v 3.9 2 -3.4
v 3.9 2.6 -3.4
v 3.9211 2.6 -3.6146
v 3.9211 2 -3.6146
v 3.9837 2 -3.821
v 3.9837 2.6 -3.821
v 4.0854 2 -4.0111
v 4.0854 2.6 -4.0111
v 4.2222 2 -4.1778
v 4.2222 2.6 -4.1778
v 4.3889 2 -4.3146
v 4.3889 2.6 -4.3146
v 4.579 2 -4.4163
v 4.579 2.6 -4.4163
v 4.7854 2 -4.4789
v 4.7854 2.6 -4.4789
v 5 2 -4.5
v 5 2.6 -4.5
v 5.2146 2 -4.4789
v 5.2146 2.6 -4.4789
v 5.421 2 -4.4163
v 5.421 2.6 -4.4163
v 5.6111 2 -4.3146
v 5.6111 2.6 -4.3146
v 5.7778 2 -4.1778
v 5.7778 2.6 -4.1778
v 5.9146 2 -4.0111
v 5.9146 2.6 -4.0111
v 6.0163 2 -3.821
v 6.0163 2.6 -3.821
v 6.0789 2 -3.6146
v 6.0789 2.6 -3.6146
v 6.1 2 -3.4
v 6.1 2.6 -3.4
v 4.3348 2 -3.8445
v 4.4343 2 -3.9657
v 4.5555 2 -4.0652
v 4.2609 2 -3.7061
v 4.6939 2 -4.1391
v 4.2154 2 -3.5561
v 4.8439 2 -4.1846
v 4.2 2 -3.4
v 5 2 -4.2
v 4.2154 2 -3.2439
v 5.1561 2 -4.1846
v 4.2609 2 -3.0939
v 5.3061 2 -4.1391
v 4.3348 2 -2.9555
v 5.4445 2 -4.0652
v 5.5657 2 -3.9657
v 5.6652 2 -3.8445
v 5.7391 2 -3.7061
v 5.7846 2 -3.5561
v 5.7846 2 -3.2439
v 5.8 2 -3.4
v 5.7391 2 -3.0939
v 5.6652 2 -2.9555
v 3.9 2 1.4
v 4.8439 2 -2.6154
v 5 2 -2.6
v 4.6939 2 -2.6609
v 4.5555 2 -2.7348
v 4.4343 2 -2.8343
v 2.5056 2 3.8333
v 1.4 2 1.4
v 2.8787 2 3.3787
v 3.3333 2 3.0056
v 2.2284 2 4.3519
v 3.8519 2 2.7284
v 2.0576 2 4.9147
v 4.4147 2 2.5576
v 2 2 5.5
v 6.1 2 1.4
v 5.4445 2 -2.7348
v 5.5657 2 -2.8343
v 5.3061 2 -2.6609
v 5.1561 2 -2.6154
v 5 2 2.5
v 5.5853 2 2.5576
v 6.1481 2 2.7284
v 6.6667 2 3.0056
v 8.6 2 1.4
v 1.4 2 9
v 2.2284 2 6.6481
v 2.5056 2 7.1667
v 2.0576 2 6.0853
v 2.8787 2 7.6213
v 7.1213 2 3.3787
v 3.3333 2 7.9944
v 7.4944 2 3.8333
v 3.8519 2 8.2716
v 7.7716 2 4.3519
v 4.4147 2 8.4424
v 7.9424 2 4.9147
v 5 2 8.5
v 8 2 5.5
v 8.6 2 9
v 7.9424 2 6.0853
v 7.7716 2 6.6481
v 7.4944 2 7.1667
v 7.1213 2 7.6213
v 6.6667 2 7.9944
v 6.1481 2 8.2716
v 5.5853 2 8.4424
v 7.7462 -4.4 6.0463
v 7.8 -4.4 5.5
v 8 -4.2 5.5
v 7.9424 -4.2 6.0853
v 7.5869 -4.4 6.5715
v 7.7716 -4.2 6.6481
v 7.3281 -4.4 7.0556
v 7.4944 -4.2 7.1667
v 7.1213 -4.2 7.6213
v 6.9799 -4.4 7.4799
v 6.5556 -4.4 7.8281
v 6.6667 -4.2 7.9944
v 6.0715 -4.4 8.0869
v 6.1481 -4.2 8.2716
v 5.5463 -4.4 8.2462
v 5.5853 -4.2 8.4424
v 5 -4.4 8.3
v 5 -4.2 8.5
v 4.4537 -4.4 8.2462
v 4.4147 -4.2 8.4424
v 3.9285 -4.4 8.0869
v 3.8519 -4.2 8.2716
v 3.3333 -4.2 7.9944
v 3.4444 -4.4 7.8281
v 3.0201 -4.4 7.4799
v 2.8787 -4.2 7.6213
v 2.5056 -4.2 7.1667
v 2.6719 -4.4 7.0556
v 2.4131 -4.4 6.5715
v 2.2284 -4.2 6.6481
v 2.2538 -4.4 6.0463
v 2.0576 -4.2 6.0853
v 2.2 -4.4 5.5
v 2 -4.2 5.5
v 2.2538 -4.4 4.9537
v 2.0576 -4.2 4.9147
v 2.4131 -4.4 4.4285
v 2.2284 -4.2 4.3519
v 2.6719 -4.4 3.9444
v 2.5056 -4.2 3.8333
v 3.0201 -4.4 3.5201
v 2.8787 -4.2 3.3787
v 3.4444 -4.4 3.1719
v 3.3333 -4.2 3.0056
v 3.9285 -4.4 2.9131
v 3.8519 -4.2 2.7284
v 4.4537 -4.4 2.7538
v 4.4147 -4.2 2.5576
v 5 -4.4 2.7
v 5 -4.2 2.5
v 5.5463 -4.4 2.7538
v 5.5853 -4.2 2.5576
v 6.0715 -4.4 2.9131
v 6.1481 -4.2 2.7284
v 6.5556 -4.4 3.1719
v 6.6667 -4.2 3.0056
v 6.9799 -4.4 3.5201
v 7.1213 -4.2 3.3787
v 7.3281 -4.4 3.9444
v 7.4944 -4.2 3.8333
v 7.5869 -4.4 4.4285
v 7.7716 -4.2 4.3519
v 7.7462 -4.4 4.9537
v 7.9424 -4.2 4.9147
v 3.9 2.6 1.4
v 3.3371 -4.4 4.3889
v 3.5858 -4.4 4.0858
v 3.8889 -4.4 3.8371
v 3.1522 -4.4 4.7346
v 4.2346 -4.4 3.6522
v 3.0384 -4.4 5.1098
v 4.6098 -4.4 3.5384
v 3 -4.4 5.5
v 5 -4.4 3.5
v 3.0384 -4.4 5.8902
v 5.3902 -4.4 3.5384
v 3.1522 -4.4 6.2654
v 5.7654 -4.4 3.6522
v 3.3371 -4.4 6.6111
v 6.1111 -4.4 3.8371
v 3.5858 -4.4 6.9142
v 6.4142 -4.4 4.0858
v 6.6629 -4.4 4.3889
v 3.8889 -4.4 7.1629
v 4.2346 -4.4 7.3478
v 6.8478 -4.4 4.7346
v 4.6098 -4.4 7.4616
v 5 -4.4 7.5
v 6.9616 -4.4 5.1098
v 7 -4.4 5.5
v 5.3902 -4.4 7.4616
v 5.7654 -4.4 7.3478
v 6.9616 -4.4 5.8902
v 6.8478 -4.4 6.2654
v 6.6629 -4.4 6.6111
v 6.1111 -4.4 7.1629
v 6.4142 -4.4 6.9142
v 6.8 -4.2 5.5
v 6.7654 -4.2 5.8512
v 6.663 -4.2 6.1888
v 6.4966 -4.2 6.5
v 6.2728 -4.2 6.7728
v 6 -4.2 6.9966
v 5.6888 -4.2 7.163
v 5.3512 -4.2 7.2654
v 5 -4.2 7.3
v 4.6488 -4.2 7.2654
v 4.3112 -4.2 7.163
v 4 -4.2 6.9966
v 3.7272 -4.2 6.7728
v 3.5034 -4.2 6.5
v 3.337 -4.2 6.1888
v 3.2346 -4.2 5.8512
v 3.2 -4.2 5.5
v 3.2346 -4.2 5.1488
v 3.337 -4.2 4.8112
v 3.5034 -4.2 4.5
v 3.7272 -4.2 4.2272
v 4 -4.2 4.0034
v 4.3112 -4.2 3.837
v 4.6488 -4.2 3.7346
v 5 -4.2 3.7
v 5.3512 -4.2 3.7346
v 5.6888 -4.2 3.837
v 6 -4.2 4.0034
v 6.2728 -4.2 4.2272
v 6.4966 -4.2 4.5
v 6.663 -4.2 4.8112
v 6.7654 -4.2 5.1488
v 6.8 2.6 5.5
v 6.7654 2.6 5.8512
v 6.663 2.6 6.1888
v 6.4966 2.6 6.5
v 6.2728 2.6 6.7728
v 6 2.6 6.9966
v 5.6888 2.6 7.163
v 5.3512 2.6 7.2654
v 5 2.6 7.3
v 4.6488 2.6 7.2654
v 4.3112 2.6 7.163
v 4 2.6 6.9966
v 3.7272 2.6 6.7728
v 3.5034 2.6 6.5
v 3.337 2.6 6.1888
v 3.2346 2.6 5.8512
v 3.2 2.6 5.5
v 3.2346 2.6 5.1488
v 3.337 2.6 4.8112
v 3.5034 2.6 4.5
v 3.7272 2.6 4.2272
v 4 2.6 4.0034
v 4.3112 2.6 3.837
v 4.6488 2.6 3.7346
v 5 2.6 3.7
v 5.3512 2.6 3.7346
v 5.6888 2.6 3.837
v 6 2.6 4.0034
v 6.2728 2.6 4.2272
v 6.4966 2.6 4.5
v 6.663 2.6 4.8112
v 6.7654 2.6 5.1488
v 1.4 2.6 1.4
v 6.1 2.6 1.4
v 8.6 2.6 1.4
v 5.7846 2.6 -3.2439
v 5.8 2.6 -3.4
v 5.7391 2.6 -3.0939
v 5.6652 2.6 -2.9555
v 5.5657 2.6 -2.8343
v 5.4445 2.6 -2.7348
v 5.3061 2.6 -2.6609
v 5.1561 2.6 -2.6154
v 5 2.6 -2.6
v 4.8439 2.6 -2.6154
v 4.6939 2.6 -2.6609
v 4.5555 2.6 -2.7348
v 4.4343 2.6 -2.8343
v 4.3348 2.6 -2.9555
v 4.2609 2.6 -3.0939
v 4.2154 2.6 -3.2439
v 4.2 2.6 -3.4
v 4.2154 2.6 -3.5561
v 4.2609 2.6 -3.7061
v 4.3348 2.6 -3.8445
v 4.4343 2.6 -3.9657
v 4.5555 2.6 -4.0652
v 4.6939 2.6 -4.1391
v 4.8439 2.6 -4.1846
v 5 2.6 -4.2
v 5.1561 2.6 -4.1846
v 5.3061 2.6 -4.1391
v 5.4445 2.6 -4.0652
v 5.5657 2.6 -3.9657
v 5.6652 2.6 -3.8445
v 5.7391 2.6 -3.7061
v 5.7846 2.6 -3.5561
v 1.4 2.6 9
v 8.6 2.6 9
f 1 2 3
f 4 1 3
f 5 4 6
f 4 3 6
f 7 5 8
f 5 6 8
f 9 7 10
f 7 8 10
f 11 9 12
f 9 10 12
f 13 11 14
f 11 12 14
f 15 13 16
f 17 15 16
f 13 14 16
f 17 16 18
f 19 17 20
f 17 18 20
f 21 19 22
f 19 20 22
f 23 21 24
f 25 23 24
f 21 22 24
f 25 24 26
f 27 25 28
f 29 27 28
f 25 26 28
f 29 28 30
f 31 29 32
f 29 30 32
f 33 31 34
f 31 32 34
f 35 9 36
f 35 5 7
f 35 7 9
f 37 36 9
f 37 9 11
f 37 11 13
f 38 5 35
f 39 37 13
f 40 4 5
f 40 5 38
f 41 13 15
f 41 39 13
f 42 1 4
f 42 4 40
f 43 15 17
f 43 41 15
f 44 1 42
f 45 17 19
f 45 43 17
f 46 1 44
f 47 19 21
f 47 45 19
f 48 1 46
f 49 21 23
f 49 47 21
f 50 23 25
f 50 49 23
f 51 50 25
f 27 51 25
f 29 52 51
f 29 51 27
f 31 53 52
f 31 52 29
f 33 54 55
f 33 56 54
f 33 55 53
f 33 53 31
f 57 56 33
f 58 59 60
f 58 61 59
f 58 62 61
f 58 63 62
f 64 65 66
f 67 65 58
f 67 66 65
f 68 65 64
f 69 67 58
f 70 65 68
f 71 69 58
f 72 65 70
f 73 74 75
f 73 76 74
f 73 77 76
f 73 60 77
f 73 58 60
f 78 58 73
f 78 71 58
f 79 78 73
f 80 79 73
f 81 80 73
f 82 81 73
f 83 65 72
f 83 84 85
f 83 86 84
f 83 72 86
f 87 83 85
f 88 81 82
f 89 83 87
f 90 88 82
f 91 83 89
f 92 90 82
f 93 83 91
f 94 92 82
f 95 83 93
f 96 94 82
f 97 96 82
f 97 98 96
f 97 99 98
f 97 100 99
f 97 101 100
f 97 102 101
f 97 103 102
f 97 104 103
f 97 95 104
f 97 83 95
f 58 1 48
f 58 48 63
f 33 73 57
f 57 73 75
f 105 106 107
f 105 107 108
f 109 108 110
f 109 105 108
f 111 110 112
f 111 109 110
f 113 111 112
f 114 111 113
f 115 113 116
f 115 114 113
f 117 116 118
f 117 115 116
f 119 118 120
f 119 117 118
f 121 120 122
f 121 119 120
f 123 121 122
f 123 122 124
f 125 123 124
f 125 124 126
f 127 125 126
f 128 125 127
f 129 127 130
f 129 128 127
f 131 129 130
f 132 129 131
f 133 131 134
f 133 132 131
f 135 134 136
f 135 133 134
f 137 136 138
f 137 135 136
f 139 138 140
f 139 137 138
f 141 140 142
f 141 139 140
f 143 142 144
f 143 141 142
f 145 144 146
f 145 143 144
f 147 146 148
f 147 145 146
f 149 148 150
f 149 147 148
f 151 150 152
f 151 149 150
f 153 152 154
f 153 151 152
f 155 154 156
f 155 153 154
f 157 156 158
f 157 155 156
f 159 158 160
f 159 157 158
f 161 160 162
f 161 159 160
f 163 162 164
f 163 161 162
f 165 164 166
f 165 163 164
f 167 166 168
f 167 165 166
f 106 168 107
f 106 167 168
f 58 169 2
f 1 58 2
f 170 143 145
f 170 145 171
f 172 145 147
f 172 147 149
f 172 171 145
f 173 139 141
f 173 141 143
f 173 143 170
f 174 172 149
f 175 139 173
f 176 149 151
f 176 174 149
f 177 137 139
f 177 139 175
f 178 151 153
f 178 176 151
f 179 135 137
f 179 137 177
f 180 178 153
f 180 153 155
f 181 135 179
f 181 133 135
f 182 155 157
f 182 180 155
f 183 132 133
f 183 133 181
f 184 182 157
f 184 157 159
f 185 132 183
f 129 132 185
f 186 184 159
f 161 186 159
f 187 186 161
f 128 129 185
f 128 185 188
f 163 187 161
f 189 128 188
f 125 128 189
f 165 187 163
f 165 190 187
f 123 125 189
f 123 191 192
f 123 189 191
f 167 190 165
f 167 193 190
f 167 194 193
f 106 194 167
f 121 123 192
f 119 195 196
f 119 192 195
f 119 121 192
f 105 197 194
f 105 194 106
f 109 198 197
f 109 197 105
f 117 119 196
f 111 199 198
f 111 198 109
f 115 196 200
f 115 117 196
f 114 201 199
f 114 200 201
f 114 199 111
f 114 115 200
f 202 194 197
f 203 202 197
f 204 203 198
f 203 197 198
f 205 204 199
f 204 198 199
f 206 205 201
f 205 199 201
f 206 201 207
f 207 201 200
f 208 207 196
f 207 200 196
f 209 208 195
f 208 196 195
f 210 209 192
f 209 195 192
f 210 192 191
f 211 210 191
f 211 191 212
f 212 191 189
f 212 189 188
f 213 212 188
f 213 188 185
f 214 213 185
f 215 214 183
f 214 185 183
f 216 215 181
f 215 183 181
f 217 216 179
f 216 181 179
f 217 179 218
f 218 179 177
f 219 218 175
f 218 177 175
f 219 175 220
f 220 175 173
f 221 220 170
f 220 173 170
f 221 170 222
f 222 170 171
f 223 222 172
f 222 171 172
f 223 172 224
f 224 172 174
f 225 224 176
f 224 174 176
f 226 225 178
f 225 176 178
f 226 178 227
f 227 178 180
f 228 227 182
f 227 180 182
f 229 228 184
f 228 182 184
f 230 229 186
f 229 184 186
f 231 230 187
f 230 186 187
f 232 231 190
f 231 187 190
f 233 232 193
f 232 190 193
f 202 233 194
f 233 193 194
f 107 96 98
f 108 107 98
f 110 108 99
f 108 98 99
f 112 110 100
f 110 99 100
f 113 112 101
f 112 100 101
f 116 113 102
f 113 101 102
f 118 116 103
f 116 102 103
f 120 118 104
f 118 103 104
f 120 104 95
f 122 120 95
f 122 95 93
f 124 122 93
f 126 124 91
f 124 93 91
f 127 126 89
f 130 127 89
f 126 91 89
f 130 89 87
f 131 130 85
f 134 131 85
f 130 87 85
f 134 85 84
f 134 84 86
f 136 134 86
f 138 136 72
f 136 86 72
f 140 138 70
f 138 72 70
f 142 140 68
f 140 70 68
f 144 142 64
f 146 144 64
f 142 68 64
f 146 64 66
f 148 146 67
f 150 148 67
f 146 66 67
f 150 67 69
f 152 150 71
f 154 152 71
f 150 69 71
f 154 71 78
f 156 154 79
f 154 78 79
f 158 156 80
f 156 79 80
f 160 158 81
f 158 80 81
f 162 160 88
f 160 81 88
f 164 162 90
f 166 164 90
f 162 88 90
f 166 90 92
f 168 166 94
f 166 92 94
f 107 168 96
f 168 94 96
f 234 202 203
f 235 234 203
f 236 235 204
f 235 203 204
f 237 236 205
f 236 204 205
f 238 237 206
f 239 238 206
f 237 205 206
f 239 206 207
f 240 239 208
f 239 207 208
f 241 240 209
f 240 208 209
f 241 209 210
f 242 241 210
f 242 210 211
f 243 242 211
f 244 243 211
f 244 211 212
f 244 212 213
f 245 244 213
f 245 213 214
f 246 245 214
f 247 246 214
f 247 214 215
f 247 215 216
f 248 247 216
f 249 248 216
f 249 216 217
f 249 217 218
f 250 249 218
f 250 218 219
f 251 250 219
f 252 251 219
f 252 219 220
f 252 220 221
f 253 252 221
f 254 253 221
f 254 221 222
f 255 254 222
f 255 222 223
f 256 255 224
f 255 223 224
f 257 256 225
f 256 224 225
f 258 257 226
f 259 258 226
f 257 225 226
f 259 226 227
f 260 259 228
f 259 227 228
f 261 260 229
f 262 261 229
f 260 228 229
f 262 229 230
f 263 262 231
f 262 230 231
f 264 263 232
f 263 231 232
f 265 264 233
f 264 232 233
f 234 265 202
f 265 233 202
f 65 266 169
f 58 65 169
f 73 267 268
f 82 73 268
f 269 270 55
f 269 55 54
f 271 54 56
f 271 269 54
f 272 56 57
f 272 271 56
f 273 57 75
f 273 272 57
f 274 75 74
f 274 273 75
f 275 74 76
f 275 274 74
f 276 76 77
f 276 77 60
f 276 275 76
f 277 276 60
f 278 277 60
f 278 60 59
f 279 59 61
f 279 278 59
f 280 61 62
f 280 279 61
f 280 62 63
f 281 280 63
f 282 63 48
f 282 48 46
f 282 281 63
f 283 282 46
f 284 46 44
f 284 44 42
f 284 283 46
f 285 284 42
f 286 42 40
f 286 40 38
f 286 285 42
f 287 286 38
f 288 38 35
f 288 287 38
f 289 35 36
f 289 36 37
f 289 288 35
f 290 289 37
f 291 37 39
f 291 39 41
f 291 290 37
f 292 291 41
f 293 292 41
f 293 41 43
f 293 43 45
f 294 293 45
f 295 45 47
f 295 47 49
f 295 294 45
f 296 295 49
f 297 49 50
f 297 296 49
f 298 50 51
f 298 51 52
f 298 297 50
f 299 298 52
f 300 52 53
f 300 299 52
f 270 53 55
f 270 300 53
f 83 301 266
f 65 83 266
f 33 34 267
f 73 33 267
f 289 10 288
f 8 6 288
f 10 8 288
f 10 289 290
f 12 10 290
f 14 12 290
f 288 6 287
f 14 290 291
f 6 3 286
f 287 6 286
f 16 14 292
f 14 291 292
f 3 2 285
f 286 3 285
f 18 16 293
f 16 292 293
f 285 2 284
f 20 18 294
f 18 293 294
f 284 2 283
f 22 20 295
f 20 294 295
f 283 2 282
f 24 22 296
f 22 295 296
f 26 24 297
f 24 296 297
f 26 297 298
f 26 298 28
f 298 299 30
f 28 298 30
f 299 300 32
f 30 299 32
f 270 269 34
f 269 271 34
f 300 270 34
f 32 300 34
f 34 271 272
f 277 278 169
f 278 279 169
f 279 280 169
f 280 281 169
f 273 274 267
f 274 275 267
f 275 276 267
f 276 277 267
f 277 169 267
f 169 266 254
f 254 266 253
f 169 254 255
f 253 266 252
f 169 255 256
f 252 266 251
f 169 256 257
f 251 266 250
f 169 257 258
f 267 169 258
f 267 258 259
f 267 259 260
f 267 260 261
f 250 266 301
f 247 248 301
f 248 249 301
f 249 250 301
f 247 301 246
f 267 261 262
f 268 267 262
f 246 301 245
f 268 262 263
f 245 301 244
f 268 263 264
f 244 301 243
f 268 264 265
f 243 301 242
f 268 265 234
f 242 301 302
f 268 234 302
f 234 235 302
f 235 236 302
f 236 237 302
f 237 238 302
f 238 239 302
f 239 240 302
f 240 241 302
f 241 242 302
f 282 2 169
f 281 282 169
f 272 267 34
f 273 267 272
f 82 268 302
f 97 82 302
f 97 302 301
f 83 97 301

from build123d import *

# Parameters (mm, degrees)
SKETCH005_R     = 0.8
PAD001_DEPTH    = 0.6
SKETCH006_R     = 3
PAD002_DEPTH    = 6.4
SKETCH007_R     = 1.8
POCKET003_DEPTH = 9
CHAMFER_SIZE    = 0.2


with BuildPart() as part:
    # Sketch005 → Pad001 (new body)
    with BuildSketch(Plane.XZ):
        with BuildLine():
            Line((7.2, 7.6), (0, 7.6))
            Line((0, 7.6), (0, 0))
            Line((0, 0), (2.5, 0))
            Line((2.5, 0), (2.5, -4.8))
            ThreePointArc((2.5, -4.8), (3.6, -5.9), (4.7, -4.8))
            Line((4.7, -4.8), (4.7, 0))
            Line((4.7, 0), (7.2, 0))
            Line((7.2, 0), (7.2, 7.6))
        make_face()
        with Locations((3.6, -4.8)):
            Circle(SKETCH005_R, mode=Mode.SUBTRACT)
    extrude(amount=PAD001_DEPTH)

    # Sketch006 (on Face11 of Pad001) → Pad002 (join)
    with BuildSketch(Plane.XZ.offset(0.6)):
        with Locations((3.6, 4.1)):
            Circle(SKETCH006_R)
    extrude(amount=PAD002_DEPTH)

    # Sketch007 (on Face13 of Pad002) → Pocket003 (cut)
    with BuildSketch(Plane.XZ.offset(7)):
        with Locations((3.6, 4.1)):
            Circle(SKETCH007_R)
    extrude(amount=-POCKET003_DEPTH, mode=Mode.SUBTRACT)

    # Chamfer
    chamfer_edges = [part.edges().sort_by_distance(p)[0] for p in [
        (0.6, -7, 4.1),
        (1.8, -7, 4.1),
    ]]
    chamfer(chamfer_edges, length=CHAMFER_SIZE)


with BuildPart() as part_1:
    # Body placement: moved
    add(part.part.moved(Location((1.4, 2.6, 1.4))))


solid = part_1.part
